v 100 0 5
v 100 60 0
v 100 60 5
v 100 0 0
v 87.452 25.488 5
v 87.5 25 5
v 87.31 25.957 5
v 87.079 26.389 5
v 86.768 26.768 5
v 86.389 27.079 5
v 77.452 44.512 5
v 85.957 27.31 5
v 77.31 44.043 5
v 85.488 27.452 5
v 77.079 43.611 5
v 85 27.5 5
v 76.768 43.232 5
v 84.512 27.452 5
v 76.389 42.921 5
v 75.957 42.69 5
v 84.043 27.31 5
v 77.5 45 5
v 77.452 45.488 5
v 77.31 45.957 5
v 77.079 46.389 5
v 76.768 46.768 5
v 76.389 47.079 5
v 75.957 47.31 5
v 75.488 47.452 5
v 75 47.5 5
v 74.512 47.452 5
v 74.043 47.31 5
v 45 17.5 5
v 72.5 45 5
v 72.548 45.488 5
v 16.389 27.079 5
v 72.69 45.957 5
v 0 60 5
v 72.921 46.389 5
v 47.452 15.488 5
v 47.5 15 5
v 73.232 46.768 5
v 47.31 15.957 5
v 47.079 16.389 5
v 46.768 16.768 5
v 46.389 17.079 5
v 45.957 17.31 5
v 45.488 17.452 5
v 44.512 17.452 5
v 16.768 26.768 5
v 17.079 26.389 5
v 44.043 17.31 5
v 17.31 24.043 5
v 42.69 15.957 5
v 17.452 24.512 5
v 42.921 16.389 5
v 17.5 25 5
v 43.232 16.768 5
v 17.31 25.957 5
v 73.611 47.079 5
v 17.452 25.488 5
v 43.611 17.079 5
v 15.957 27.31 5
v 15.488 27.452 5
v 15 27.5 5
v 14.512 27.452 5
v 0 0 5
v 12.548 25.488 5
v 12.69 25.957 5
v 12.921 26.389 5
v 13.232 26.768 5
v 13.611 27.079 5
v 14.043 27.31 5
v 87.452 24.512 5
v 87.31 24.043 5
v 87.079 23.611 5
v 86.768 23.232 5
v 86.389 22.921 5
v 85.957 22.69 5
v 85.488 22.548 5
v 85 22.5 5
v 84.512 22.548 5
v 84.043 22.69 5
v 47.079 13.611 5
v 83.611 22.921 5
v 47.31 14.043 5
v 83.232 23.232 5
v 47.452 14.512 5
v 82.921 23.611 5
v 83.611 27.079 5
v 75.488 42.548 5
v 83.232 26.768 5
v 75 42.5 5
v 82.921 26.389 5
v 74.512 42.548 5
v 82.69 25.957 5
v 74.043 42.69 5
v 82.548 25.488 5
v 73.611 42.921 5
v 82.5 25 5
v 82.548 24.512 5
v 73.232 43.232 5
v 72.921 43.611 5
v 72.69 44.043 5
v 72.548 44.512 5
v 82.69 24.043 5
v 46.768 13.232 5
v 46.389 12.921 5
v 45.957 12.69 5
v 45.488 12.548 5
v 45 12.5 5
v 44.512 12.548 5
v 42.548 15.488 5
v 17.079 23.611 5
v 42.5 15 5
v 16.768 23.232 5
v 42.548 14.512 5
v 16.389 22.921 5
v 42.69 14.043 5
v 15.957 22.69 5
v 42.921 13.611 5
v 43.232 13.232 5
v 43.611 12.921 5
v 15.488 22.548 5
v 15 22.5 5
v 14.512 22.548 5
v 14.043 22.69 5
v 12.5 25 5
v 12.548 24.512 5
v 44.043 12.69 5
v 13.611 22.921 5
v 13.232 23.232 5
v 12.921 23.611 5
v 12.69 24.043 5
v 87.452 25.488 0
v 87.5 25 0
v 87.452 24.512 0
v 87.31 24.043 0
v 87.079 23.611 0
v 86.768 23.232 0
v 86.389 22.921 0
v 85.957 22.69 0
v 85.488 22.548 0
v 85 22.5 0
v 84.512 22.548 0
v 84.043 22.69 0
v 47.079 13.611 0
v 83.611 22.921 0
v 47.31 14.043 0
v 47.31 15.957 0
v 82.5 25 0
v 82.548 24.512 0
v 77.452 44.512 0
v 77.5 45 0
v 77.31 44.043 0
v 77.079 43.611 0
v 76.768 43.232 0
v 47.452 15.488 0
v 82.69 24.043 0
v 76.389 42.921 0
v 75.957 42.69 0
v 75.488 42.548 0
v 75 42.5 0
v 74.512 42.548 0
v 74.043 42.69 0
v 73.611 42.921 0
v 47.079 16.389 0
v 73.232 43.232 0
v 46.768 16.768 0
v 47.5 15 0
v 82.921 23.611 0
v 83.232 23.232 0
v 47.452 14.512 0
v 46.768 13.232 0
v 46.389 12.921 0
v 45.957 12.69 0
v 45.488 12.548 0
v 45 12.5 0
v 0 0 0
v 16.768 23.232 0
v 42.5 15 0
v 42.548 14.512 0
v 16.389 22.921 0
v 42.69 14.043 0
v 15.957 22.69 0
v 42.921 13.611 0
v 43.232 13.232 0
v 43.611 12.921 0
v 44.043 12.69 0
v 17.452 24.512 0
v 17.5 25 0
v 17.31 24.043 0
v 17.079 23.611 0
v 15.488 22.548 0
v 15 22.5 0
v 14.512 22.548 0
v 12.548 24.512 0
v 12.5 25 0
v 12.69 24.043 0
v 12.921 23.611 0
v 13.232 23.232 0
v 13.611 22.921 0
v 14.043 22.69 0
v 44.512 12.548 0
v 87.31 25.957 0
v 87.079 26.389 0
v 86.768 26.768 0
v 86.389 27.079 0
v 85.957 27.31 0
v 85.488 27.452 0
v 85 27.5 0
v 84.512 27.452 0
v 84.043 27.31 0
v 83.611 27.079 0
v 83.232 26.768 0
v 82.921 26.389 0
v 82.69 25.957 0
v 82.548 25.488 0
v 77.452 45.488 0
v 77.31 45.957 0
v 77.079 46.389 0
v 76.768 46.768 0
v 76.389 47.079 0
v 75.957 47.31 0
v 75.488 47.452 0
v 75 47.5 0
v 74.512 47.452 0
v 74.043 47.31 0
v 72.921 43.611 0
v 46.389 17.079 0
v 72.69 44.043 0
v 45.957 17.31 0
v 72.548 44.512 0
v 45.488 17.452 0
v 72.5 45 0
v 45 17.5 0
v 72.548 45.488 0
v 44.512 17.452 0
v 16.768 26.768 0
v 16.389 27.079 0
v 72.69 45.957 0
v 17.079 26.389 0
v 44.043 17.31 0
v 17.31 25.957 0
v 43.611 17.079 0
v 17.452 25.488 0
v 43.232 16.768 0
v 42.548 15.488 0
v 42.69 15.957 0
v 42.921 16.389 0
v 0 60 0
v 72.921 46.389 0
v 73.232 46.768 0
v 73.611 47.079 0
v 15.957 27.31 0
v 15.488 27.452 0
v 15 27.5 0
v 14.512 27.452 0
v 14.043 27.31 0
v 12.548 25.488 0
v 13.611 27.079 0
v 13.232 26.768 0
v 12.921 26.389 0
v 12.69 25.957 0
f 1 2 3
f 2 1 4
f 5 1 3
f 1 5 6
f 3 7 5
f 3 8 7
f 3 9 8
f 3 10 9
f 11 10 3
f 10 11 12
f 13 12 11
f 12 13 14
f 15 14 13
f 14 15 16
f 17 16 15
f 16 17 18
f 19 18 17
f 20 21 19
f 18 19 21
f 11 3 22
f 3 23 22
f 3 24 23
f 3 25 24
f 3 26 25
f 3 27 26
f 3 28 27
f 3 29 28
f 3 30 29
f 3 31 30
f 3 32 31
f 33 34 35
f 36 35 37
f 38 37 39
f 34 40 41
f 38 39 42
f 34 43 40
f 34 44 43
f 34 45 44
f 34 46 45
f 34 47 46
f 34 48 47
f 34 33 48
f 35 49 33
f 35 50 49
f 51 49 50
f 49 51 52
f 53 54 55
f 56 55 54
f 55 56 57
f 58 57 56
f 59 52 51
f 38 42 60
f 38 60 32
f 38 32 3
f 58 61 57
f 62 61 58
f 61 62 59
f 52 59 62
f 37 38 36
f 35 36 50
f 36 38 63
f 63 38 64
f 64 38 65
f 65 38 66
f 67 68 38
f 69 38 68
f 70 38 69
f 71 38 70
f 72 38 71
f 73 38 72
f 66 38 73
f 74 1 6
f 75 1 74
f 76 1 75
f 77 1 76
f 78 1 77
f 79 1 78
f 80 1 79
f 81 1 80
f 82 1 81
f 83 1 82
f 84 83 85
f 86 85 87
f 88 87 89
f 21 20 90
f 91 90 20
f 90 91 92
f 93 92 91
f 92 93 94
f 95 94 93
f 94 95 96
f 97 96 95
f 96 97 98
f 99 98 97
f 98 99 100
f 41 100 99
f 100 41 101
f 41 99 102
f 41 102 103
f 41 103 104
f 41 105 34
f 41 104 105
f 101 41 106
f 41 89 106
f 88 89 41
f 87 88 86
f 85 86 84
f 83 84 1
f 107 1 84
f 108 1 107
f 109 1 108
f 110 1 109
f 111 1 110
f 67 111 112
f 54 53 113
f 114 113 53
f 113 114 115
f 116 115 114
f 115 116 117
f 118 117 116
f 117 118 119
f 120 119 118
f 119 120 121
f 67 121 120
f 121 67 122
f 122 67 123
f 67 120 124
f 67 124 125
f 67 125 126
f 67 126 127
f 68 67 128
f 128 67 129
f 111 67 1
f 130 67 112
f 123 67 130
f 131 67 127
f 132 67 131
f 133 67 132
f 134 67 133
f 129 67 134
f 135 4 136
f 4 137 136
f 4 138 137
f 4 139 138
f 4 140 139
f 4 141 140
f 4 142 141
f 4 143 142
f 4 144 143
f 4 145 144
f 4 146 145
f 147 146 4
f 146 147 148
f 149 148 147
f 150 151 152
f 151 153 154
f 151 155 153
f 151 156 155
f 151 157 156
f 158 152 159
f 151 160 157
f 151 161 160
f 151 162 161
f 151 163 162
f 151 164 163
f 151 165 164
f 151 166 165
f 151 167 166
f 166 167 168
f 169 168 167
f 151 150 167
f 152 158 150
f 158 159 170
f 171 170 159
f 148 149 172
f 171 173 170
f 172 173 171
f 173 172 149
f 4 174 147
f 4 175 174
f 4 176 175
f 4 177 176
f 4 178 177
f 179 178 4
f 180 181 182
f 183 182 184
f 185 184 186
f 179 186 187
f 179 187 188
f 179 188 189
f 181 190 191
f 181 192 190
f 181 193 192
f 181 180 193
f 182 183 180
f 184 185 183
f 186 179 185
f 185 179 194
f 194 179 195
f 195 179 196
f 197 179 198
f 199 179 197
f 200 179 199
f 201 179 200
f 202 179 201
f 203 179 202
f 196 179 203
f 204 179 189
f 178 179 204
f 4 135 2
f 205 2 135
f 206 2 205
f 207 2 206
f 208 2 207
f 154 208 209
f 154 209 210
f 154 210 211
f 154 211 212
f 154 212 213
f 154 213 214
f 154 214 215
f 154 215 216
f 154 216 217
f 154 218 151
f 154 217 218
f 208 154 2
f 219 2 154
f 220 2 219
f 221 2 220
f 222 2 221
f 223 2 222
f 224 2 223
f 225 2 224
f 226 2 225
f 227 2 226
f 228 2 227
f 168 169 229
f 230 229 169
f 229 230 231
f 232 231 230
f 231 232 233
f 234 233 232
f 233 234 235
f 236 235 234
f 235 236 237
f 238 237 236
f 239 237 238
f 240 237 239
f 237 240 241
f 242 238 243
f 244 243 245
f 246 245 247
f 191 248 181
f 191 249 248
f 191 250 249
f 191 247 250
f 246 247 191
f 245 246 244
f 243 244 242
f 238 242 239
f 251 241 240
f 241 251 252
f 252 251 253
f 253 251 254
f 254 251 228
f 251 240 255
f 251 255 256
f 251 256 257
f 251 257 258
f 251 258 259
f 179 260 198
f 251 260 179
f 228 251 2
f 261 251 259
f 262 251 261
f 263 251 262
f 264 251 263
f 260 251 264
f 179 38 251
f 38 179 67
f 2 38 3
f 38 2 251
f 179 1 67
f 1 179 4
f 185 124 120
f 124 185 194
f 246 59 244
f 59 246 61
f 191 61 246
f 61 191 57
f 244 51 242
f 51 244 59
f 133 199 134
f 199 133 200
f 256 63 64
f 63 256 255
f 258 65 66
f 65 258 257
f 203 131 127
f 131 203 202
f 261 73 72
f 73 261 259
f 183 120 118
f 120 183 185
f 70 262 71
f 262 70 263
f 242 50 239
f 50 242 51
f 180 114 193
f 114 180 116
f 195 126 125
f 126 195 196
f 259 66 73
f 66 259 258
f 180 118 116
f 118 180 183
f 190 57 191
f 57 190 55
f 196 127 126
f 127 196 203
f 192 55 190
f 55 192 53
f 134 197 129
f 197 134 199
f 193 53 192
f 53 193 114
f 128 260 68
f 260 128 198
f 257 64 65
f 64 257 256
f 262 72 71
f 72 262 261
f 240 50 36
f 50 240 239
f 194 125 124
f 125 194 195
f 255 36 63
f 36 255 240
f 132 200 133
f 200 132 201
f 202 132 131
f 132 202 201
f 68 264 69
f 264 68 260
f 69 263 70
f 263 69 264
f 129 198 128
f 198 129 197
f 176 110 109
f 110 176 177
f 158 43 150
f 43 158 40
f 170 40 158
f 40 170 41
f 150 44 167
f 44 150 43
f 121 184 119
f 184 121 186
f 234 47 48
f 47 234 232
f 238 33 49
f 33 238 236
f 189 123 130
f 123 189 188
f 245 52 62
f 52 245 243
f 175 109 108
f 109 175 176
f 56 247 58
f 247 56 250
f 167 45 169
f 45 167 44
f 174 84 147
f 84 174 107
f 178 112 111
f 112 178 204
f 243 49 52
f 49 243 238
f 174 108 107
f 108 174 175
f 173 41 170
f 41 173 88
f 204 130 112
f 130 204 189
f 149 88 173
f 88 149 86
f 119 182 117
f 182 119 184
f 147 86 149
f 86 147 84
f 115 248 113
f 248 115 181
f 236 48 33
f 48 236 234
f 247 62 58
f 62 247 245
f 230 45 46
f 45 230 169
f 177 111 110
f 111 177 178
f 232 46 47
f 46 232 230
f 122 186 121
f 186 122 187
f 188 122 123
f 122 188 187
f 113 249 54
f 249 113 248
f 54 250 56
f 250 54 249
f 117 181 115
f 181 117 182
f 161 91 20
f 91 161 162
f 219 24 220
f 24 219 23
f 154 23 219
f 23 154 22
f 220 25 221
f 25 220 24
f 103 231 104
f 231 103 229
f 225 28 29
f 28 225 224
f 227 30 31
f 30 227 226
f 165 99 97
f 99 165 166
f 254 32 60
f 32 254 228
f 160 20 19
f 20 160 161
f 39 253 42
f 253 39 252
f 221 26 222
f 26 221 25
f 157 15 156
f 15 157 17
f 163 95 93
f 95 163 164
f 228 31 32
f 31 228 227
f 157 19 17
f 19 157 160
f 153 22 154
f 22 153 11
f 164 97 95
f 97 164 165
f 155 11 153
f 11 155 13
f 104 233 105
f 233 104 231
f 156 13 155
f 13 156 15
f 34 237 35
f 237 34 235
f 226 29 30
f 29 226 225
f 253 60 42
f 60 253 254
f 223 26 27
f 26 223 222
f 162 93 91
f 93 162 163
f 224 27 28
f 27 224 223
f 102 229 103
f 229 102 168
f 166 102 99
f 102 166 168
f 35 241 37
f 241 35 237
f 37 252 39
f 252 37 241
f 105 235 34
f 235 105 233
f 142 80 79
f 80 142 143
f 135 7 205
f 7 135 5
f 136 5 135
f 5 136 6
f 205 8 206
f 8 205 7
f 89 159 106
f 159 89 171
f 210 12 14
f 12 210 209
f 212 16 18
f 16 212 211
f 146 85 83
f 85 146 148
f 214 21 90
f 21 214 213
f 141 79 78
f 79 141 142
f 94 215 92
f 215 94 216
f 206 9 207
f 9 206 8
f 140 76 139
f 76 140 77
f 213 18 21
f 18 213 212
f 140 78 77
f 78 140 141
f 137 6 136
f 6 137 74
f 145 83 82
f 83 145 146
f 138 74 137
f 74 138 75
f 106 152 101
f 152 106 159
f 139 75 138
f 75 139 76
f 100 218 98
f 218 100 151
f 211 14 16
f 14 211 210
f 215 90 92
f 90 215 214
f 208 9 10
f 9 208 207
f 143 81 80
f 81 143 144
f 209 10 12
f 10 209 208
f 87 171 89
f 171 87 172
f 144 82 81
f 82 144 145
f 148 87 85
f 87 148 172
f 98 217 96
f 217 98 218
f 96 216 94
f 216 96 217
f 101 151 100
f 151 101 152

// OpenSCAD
$fn = 32;

// ----------------------------------------------------------------------
// Hole field: plate with holes at given coordinates
// ----------------------------------------------------------------------

// --- parameters (mm) ---
plate_l = 100;            // plate length, X
plate_w = 60;             // plate width, Y
plate_t = 5;              // plate thickness, Z
hole_d = 5;               // hole diameter

difference() {
  cube([plate_l, plate_w, plate_t]);
  translate([15, 25, -1]) cylinder(h = plate_t + 2, d = hole_d);
  translate([45, 15, -1]) cylinder(h = plate_t + 2, d = hole_d);
  translate([75, 45, -1]) cylinder(h = plate_t + 2, d = hole_d);
  translate([85, 25, -1]) cylinder(h = plate_t + 2, d = hole_d);
}
